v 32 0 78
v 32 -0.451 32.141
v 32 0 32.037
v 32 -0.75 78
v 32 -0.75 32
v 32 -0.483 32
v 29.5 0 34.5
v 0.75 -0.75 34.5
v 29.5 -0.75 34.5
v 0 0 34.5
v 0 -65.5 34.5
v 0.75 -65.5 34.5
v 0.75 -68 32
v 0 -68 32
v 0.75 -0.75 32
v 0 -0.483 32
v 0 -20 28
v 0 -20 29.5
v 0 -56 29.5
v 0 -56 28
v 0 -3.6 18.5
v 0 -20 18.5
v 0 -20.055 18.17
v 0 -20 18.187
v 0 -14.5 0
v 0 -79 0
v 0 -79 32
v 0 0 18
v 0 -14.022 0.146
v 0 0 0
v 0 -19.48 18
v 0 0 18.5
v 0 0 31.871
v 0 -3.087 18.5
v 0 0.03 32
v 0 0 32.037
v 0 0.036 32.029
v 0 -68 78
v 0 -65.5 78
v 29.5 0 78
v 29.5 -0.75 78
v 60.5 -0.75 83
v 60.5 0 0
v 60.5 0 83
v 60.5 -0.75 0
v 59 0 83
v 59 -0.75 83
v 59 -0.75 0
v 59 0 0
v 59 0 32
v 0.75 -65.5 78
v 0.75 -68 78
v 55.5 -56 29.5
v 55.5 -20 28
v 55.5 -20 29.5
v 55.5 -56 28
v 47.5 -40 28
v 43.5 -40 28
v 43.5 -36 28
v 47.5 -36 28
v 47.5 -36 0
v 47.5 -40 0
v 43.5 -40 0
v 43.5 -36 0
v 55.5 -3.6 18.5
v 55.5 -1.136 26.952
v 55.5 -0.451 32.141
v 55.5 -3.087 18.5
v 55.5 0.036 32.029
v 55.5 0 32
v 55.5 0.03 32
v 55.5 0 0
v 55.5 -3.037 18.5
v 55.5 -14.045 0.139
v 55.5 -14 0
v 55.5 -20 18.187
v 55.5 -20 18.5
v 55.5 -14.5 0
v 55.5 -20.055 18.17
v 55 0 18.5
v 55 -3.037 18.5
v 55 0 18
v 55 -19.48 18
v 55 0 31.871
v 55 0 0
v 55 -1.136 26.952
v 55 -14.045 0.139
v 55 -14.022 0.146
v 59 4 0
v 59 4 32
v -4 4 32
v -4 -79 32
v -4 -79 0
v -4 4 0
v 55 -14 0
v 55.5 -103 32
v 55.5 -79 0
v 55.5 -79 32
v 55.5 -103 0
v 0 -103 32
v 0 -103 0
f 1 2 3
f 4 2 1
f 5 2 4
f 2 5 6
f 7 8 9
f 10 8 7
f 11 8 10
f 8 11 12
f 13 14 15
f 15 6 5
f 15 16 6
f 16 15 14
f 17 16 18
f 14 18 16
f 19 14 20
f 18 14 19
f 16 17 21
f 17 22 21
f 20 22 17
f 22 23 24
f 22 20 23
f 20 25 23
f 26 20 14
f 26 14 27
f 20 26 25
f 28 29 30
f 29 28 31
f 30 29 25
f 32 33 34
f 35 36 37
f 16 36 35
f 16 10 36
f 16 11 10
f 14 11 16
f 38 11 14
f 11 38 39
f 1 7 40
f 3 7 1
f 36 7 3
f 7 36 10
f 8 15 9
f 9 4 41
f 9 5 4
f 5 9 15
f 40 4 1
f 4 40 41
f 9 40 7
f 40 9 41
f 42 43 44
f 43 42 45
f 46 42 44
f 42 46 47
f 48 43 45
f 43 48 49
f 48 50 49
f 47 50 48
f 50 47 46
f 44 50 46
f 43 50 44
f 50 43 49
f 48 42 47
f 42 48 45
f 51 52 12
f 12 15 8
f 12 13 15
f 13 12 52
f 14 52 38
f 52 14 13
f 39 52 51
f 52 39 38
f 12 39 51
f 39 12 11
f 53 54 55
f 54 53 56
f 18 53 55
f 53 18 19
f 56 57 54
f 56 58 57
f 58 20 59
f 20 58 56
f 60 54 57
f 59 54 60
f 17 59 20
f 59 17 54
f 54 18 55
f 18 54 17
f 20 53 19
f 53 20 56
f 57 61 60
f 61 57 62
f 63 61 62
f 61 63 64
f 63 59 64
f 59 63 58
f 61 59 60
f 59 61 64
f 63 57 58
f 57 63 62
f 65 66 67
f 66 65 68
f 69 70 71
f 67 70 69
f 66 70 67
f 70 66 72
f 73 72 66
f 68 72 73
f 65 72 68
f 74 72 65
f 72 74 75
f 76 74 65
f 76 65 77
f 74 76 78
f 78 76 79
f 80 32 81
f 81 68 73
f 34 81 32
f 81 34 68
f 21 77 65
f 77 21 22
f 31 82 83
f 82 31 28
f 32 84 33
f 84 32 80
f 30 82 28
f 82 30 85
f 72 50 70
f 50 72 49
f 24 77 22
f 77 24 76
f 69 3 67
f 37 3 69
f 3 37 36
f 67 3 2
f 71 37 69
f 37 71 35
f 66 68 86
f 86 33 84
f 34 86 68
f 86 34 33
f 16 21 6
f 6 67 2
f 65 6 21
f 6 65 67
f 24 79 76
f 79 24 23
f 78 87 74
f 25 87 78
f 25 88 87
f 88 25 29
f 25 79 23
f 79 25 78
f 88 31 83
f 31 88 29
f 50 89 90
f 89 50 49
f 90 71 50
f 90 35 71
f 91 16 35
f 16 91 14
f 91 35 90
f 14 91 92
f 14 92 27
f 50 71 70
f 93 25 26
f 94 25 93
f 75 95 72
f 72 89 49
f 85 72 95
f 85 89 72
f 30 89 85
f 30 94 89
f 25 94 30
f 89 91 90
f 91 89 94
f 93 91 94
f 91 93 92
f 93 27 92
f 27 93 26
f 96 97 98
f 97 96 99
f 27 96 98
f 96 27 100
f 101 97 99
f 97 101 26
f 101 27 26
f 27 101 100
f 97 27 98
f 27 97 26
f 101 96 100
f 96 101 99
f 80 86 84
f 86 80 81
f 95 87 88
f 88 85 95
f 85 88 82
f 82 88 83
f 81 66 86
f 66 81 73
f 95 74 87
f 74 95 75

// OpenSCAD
// Amorosi Kitchen Nook, Table and Bench
// by SrAmo  July, 2025
// Modeled in OpenSCAD.  Colors are just for visulization.
// origin is NW corner, X is east, Y is north, z is up
// units are in inches
F_BW = 32; // inch from floor to bottom of windows
NW_DF = 59; // inch north wall to door frame

// North wall, to door frame
color("lightyellow")
    cube([NW_DF,4,32]); // wall
color("chocolate") {
    translate([0,-0.75,F_BW])
        cube([32,0.75,2.5]); // lower window trim
    translate([29.5,-0.75,F_BW])
       cube([2.5,0.75,46]); // vertical window trim
    translate([NW_DF,-0.75,0])
       cube([1.5,0.75,83]); // vertical door trim
    };

// West wall to counter
color("LemonChiffon") 
    translate([-4,-79,0]) cube([4,79+4,32]);
color("chocolate") {
    translate([0,-68,F_BW])
        cube([0.75,68,2.5]); // lower window trim
     translate([0,-68,F_BW])
       cube([0.75,2.5,46]); // vertical window trim
    };

// South cabinet counter 
color("PapayaWhip")
    translate([0,-24-79,0]) cube([55.5,24,32]);

BENCH_WIDTH = 20; // used to position table

// TABLE
color("chocolate") { 
    THK = 1.5; // slab?
    LEN = 55.5; 
    WIDTH = 36;
    translate([0,-WIDTH-BENCH_WIDTH,28]) {
        cube([LEN,WIDTH,THK]); // table top
        translate([LEN-10,WIDTH/2,-14]) 
            cube([4,4,28],center=true); // post
    };
};

// BENCH
PLY_THK = 0.5;
BENCH_LEN = 55.5;  // Sized for two people
BENCH_SEAT_HGT = 18; // Height of seat before cushion
color("sandybrown") { 
    translate([0,-BENCH_WIDTH,BENCH_SEAT_HGT]) 
        cube([BENCH_LEN,BENCH_WIDTH,PLY_THK]); // seat
    translate([0,-3.6,BENCH_SEAT_HGT+PLY_THK]) 
        rotate([-13,0,0]) // BACK IS ROTATED 13 DEG
            cube([BENCH_LEN,PLY_THK,14]); // back rest
    translate([0,-14.5,0]) 
        rotate([17,0,0])  // KICK IS ROTATED 17 DEG
            cube([BENCH_LEN,PLY_THK,19]); // kick
};
// BENCH END COVER REPRESENTATION
color("tan") { 
    translate([BENCH_LEN,0,0]) 
    rotate([90,0,-90]) 
    linear_extrude(PLY_THK) 
        // Ploygon points start in x,y system, which is on the floor,
        // and need to be rotated per above rotate()
        polygon([[0,0],[0,F_BW],[sin(13)*13.5,BENCH_SEAT_HGT+PLY_THK],
        [BENCH_WIDTH,BENCH_SEAT_HGT+PLY_THK],[14,0]]);
};
